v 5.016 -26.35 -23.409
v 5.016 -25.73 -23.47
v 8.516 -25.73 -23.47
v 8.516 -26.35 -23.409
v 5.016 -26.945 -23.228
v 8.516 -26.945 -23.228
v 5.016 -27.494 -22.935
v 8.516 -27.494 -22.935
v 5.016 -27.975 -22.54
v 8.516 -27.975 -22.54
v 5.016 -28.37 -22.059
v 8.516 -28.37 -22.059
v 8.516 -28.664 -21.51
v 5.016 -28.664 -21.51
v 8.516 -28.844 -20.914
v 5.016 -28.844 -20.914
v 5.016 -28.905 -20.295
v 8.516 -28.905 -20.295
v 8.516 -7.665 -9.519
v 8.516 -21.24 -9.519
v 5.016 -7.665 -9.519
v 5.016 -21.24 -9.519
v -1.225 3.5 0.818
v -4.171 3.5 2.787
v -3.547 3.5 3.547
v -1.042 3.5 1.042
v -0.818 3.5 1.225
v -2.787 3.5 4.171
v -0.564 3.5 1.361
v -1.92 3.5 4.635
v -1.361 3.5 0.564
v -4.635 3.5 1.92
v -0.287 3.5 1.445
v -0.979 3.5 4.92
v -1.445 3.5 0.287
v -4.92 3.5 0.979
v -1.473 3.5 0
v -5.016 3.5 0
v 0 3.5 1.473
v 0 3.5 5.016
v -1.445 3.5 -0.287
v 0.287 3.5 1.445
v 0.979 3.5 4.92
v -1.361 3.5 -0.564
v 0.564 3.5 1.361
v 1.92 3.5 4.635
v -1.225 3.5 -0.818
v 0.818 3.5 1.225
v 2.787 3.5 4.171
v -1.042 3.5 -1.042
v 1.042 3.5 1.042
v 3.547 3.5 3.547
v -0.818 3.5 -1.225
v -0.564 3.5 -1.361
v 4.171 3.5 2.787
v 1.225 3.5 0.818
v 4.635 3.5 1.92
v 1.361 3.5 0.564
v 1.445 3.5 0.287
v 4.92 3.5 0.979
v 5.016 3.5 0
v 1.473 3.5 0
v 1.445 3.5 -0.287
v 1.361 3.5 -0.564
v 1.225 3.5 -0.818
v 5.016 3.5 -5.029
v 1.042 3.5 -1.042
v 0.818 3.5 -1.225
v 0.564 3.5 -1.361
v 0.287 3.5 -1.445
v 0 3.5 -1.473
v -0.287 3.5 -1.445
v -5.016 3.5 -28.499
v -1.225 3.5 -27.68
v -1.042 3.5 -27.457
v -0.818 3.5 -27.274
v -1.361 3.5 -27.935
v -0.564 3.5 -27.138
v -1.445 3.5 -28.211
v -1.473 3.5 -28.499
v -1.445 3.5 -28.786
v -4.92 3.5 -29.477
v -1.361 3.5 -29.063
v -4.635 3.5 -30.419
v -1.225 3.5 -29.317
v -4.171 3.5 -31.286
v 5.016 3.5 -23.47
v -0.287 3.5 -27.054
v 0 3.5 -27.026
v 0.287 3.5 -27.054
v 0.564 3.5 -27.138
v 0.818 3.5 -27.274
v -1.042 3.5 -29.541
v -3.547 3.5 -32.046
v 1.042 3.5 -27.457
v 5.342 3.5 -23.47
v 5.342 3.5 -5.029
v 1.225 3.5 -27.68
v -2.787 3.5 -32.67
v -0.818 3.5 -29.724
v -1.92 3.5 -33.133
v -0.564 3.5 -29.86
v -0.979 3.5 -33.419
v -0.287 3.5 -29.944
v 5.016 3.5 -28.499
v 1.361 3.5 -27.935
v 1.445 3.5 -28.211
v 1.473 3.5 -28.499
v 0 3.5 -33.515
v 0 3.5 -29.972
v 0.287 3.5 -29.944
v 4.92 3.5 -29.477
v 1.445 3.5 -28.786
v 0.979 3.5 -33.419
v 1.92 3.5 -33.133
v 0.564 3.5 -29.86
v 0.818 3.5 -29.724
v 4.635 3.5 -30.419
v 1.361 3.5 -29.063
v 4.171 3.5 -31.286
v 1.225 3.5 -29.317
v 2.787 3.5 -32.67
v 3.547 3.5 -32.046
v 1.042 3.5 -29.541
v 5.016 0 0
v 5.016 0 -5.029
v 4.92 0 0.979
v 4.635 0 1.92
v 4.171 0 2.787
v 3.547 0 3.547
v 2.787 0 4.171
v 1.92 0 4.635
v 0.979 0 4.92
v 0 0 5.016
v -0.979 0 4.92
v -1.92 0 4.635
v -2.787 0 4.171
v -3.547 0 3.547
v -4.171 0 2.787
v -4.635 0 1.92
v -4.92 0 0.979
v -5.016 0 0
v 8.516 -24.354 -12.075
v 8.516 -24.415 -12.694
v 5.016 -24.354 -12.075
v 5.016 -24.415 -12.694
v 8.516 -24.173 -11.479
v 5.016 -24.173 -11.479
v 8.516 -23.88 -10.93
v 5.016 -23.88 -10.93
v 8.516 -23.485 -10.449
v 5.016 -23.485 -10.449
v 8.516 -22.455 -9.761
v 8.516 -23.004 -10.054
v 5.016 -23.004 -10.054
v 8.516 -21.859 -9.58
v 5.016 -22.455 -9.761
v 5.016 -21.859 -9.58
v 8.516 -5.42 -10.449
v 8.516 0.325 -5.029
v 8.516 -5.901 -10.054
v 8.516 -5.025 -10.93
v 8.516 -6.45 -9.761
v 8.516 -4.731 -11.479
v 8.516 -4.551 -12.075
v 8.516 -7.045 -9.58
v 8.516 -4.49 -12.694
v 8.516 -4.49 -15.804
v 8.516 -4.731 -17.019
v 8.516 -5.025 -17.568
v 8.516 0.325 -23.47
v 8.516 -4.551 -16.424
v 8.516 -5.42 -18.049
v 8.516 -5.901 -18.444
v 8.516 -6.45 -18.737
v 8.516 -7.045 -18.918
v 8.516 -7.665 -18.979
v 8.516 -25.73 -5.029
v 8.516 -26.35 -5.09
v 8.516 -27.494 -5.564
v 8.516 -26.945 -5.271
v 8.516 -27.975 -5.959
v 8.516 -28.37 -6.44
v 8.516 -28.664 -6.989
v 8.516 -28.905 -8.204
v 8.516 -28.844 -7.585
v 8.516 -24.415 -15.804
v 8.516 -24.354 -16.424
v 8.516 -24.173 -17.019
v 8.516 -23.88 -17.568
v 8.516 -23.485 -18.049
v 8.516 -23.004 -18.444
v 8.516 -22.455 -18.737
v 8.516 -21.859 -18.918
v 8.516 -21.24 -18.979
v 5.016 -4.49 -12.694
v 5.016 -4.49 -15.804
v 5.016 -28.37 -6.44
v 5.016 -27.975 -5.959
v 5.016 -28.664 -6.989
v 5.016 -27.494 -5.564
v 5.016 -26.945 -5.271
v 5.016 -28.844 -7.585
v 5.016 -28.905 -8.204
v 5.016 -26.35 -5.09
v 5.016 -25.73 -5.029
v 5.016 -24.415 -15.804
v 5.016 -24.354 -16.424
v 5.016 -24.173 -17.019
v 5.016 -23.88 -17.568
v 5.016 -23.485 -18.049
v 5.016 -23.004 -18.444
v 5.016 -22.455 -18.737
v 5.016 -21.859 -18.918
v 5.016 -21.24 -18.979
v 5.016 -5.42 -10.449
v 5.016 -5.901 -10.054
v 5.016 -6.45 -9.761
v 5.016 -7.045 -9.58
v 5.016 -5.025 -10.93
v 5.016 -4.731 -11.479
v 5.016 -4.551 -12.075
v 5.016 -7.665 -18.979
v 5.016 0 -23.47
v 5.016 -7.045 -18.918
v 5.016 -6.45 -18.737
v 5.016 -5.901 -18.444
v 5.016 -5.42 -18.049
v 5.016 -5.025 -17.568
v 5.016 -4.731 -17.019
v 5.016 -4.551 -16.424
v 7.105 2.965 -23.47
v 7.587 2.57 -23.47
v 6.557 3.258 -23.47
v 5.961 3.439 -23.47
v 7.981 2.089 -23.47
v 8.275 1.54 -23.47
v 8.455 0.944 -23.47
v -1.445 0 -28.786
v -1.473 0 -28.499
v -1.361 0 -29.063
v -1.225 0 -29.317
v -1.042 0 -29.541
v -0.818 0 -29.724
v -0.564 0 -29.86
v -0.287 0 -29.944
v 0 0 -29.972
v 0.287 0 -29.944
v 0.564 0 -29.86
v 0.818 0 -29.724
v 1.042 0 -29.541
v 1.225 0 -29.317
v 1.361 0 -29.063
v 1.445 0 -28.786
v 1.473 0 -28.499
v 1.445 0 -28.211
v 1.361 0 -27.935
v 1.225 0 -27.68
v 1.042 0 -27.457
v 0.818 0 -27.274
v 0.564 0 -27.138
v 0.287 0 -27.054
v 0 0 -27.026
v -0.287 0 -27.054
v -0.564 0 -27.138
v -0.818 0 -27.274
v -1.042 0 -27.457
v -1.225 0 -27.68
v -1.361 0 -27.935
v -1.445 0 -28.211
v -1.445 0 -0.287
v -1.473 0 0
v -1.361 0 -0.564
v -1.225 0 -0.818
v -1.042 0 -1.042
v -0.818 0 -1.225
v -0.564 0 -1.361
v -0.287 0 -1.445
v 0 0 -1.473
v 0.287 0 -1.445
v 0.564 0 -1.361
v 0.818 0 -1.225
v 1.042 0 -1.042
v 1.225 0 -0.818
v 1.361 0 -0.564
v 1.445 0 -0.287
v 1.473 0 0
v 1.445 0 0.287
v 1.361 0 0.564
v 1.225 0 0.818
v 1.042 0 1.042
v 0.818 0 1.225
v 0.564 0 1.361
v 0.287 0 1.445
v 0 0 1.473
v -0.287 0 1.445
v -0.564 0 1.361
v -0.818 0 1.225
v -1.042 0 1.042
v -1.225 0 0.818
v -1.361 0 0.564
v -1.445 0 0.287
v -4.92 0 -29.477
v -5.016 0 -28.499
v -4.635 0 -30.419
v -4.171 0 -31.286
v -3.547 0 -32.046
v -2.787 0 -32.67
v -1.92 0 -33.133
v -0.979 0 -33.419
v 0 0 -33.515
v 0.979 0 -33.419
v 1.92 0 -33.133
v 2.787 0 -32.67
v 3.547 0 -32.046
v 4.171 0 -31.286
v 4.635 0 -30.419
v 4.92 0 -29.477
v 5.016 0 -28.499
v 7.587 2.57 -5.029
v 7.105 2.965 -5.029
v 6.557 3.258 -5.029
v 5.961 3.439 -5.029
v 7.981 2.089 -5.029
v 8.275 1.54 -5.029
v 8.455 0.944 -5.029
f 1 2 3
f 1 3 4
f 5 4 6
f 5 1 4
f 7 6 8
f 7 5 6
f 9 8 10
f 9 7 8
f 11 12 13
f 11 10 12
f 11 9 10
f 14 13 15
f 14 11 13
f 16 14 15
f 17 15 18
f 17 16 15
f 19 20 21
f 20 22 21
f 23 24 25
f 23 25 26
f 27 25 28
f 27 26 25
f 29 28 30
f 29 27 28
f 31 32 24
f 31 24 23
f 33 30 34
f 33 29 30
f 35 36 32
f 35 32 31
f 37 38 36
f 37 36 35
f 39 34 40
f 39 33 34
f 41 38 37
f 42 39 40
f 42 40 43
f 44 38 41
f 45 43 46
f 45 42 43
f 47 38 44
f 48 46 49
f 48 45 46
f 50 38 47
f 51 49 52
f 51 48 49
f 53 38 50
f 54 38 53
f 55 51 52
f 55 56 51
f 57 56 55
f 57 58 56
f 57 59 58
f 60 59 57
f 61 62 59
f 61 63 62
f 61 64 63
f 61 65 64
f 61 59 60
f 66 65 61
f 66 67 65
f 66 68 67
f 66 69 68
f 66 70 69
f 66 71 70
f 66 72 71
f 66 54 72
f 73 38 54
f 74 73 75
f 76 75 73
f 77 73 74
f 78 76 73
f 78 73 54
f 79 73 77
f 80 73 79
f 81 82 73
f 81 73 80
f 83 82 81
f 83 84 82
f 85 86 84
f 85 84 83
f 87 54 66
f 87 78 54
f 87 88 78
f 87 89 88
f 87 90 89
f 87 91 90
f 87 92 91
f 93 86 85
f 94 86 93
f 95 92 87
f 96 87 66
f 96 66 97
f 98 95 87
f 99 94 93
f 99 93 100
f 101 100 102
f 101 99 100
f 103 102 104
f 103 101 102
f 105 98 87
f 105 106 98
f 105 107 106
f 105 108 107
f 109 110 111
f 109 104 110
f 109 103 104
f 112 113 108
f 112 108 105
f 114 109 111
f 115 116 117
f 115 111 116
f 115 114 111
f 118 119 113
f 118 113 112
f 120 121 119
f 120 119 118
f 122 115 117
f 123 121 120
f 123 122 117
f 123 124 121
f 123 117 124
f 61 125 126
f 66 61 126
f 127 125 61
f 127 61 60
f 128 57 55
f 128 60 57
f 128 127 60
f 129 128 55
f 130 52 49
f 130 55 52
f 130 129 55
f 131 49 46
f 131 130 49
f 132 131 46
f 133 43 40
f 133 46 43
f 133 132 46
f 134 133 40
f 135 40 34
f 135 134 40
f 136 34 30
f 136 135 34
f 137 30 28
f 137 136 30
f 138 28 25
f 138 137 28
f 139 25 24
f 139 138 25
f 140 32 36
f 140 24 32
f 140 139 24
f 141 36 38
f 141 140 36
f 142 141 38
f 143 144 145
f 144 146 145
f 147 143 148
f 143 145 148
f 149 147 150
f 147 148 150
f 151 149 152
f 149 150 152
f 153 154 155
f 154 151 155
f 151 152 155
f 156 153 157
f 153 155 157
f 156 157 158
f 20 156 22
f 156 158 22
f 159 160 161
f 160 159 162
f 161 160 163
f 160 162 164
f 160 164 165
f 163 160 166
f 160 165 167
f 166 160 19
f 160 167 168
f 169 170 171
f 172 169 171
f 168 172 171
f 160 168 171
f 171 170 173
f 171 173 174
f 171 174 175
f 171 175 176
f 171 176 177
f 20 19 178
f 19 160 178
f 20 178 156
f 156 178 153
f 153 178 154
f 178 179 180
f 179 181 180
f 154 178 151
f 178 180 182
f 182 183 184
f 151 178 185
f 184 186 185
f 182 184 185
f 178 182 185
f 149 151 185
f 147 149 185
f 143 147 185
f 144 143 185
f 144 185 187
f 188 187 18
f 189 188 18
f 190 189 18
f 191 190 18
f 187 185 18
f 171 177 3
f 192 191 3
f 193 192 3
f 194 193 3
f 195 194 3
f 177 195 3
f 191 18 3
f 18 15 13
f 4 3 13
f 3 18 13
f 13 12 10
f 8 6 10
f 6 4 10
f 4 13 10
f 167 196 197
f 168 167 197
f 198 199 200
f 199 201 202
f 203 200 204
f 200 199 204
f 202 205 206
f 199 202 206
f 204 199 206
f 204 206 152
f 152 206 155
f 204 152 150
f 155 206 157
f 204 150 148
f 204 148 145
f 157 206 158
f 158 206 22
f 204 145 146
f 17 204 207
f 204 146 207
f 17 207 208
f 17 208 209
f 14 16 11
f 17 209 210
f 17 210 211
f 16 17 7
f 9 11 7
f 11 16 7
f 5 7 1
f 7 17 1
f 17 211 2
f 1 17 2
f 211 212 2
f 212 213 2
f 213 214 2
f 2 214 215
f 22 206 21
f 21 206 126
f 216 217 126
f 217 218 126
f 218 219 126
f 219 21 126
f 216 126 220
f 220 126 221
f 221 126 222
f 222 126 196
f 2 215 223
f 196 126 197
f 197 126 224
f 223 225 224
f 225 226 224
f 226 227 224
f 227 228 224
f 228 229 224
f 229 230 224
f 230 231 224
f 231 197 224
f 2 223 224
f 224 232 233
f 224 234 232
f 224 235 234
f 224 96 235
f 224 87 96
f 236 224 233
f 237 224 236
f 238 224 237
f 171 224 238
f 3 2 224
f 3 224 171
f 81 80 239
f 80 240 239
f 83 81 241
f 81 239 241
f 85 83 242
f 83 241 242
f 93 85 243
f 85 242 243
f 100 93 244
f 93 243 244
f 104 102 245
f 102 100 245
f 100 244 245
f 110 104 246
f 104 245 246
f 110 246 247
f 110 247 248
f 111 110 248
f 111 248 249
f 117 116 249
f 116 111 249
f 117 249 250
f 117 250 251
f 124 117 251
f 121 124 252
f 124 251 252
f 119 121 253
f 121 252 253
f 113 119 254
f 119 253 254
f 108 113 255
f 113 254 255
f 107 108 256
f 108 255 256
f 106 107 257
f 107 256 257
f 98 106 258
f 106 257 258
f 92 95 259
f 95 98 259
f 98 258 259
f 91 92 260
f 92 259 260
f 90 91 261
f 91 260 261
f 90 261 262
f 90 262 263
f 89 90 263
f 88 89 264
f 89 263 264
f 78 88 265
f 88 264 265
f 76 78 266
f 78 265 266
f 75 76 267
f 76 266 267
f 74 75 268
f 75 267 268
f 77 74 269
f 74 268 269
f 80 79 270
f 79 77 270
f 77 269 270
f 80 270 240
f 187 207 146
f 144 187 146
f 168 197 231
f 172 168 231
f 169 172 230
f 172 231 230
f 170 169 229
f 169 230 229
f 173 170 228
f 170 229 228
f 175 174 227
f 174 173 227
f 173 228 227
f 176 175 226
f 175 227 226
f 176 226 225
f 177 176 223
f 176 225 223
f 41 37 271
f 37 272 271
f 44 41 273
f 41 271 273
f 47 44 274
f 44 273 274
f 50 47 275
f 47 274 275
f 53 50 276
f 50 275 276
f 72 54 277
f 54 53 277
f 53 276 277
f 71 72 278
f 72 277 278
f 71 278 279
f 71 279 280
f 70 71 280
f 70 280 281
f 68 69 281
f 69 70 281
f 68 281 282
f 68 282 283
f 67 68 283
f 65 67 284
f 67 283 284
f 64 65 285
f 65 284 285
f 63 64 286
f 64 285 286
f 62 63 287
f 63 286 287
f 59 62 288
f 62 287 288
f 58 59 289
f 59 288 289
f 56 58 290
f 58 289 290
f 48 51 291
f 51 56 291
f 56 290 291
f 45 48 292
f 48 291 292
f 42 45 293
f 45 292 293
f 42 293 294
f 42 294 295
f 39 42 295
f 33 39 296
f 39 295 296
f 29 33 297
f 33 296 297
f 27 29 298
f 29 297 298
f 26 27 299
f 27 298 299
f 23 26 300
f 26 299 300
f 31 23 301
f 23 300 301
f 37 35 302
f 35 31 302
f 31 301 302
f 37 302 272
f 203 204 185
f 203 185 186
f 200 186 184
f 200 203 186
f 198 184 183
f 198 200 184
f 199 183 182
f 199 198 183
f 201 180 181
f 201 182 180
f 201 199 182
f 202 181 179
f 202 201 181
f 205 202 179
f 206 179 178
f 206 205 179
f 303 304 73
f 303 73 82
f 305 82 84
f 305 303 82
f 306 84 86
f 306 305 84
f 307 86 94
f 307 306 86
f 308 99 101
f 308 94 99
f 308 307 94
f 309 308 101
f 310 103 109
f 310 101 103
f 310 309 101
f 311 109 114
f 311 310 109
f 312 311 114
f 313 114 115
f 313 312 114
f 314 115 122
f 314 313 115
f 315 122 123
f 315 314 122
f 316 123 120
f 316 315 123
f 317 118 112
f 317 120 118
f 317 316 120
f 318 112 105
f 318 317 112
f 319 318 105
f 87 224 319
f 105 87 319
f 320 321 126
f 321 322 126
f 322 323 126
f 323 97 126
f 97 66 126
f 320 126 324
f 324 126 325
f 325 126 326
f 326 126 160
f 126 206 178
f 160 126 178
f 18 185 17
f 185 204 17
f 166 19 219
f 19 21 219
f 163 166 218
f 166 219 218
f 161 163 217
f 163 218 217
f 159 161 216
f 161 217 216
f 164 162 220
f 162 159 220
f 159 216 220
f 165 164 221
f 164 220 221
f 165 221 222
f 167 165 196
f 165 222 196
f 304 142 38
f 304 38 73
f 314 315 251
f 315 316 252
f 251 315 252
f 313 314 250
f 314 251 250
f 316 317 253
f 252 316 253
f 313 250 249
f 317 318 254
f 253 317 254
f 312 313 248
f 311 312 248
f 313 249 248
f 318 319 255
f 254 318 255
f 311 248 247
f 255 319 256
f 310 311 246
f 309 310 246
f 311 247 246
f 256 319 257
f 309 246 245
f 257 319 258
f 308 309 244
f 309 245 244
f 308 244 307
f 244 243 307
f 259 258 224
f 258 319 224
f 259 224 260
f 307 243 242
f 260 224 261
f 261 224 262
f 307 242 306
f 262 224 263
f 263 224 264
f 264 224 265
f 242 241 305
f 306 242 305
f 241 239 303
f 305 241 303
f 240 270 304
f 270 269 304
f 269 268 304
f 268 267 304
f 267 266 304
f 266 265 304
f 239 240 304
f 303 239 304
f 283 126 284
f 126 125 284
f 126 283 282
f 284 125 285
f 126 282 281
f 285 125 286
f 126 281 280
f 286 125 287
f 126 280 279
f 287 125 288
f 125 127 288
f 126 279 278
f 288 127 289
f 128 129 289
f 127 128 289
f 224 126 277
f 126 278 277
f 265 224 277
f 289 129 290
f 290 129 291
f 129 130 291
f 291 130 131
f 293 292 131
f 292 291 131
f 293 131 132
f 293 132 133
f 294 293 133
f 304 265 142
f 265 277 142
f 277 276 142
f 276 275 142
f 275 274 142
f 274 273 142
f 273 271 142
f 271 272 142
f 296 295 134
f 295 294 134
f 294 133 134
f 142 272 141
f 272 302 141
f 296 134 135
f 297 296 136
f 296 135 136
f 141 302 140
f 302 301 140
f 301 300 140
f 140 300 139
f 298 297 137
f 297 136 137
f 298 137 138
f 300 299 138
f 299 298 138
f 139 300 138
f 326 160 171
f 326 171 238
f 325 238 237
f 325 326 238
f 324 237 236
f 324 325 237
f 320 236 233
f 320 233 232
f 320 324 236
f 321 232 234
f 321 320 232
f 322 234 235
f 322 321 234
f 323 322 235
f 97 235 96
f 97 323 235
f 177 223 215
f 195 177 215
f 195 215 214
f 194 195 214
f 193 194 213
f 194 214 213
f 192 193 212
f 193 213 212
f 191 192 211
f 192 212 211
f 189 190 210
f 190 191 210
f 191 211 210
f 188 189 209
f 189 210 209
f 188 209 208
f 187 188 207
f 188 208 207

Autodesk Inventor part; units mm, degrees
ref_plane "YZ Plane" through (0, 0, 0) normal (1, 0, 0) x (0, 1, 0)
ref_plane "XZ Plane" through (0, 0, 0) normal (0, 1, 0) x (-1, 0, 0)
ref_plane "XY Plane" through (0, 0, 0) normal (0, 0, 1) x (1, 0, 0)
sketch "Sketch1" plane through (0, 0, 0) normal (0, 1, 0) x (-1, 0, 0)
  circle A0 centre (0, 0) radius 1.4732
  circle A1 centre (0, -28.4988) radius 1.4732
  circle A2 centre (0, 0) radius 5.0165
  circle A3 centre (0, -28.4988) radius 5.0165
  line L0 (5.0165, 0) -> (5.0165, -28.4988)
  line L1 (-5.0165, 0) -> (-5.0165, -28.4988)
  dimension "d0" = 2.9464
  dimension "d2" = 2.9464
  dimension "d3" = 10.033
  dimension "d4" = 10.033
extrude "Extrusion1" add sketch "Sketch1" along normal blind 3.5
sketch "Sketch2" plane through (5.0165, 0, 0) normal (1, 0, 0) x (0, 0, -1)
  line L0 (0, 0) -> (28.4988, 0) projected
  line L1 (0, 0) -> (5.0292, 0)
  line L2 (28.4988, 0) -> (28.4988, 3.5) projected
  line L3 (28.4988, 0) -> (23.4696, 0)
  line L4 (23.4696, 0) -> (5.0292, 0)
  line L5 (5.0292, 0) -> (5.0292, -25.7302)
  line L6 (8.2042, -28.9052) -> (20.2946, -28.9052)
  line L7 (23.4696, -25.7302) -> (23.4696, 0)
  line L8 (5.0292, 0) -> (23.4696, 0)
  line L9 (5.0292, 0) -> (11.3792, 0)
  line L10 (23.4696, 0) -> (17.1196, 0)
  line L11 (5.0292, -28.9052) -> (11.3792, -28.9052)
  arc A0 (5.0292, -25.7302) -> (8.2042, -28.9052) centre (8.2042, -25.7302) ccw
  arc A1 (20.2946, -28.9052) -> (23.4696, -25.7302) centre (20.2946, -25.7302) ccw
  line L12 (15.8041, -24.4147) -> (12.694, -24.4147)
  line L13 (12.694, -4.4898) -> (15.8041, -4.4898)
  line L14 (18.9791, -7.6648) -> (18.9791, -21.2397)
  line L15 (9.519, -21.2397) -> (9.519, -7.6648)
  arc A2 (12.694, -4.4898) -> (9.519, -7.6648) centre (12.694, -7.6648) ccw
  arc A3 (9.519, -21.2397) -> (12.694, -24.4147) centre (12.694, -21.2397) ccw
  arc A4 (15.8041, -24.4147) -> (18.9791, -21.2397) centre (15.8041, -21.2397) ccw
  arc A5 (18.9791, -7.6648) -> (15.8041, -4.4898) centre (15.8041, -7.6648) ccw
  point P0 (9.519, -24.4147)
  dimension "d7" = 5.0292
  dimension "d8" = 5.0292
  dimension "d9" = 28.9052
  dimension "d10" = 6.35
  dimension "d14" = 6.35
  dimension "d17" = 3.175
  dimension "d23" = 6.35
  dimension "d25" = 3.175
extrude "Extrusion4" add sketch "Sketch2" along normal blind 3.5
sketch "Sketch4" plane through (5.0165, 0, -5.0292) normal (0, 1, 0) x (1, 0, 0)
  line L0 (0, 0) -> (3.5, 0) projected
  line L1 (3.5, 15.2654) -> (3.5, 18.4404) projected
  line L2 (3.5, 0) -> (3.5, 18.4404)
  line L3 (0, 18.4404) -> (3.5, 18.4404) projected
  line L4 (3.5, 18.4404) -> (0, 18.4404)
  line L5 (0, 18.4404) -> (0, 0)
  line L6 (0, 0) -> (3.5, 0)
  point P0 (-5.0165, -5.0292)
extrude "Extrusion5" add sketch "Sketch4" along normal blind 3.5
fillet "Fillet3" radius 3.175 1 edges at (8.5165, 3.5, -14.2494)
properties part number "frontbackmount"
